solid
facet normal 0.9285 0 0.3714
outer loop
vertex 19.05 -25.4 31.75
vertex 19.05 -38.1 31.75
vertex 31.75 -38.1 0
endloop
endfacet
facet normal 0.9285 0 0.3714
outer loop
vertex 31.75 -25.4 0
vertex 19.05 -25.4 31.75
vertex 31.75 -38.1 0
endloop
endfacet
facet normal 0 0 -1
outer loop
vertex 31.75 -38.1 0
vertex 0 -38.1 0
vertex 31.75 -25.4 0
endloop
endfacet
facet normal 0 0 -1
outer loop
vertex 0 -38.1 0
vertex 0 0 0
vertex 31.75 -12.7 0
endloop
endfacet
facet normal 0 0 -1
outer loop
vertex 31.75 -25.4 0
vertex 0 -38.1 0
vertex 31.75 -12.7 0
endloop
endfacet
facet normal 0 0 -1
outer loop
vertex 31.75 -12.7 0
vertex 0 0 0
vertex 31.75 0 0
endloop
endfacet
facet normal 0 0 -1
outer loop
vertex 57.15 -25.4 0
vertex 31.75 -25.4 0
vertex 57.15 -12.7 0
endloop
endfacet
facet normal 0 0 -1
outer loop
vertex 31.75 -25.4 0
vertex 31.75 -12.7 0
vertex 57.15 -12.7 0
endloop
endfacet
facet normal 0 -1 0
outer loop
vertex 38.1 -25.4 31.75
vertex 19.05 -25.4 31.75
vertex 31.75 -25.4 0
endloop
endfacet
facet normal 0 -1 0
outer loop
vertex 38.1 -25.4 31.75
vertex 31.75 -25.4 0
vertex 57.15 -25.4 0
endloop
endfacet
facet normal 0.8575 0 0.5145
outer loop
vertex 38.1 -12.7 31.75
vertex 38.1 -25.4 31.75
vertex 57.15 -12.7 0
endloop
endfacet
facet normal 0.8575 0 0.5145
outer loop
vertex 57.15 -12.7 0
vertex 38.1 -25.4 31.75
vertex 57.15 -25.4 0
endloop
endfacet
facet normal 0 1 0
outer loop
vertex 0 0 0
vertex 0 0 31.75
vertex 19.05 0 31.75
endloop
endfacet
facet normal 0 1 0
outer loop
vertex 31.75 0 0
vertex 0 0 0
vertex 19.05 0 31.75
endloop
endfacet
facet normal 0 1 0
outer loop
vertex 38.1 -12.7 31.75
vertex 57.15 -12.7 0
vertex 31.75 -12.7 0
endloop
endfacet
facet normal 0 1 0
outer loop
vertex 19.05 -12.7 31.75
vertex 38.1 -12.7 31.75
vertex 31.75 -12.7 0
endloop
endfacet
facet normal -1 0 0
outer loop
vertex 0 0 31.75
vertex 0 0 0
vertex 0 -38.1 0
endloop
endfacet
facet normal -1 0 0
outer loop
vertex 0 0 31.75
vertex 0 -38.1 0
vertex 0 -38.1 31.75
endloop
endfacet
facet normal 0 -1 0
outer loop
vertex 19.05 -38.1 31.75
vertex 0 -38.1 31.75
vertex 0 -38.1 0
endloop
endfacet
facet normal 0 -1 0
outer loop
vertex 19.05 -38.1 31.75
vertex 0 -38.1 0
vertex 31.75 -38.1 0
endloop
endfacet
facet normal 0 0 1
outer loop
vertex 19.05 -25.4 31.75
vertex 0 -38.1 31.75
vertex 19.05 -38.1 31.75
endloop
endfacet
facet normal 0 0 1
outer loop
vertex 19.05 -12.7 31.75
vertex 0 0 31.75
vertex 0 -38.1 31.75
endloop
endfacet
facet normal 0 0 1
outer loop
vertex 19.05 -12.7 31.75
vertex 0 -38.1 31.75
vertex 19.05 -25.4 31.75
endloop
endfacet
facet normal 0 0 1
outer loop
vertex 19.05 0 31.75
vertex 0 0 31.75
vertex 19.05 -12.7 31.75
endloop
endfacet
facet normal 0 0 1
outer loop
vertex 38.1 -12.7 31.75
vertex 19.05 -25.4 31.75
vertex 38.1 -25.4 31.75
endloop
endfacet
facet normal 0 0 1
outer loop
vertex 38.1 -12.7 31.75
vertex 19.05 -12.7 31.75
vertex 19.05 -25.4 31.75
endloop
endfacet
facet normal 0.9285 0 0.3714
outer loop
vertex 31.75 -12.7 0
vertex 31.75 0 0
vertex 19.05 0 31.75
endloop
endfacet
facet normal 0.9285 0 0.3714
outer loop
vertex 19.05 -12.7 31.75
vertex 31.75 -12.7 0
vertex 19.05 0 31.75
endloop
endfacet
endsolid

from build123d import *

# Parameters (mm, degrees)
F0_W     = 57.15
F0_H     = 31.75
F1_DEPTH = 38.1
F3_DEPTH = 12.7
F5_DEPTH = 12.7
F7_DEPTH = 25.401


with BuildPart() as f1:
    # F0 (on Front) → F1 (new body)
    with BuildSketch(Plane.XZ):
        with Locations((28.575, 15.875)):
            Rectangle(F0_W, F0_H)
    extrude(amount=F1_DEPTH)

    # F2 (on face) → F3 (cut)
    with BuildSketch(Plane.XZ.offset(38.1)):
        Polygon((57.15, 31.75), (19.05, 31.75), (31.75, 0), (57.15, 0), align=None)
    extrude(amount=-F3_DEPTH, mode=Mode.SUBTRACT)

    # F4 (on face) → F5 (cut)
    with BuildSketch(Plane(origin=(0, 0, 0), x_dir=(-1, 0, 0), z_dir=(0, 1, 0))):
        Polygon((-31.75, 0), (-19.05, 31.75), (-57.15, 31.75), (-57.15, 0), align=None)
    extrude(amount=-F5_DEPTH, mode=Mode.SUBTRACT)

    # F6 (on face) → F7 (cut, through all)
    with BuildSketch(Plane.XZ.offset(25.4)):
        Polygon((38.1, 31.75), (57.15, 0), (57.15, 31.75), align=None)
    extrude(amount=-F7_DEPTH, mode=Mode.SUBTRACT)


solid = f1.part
